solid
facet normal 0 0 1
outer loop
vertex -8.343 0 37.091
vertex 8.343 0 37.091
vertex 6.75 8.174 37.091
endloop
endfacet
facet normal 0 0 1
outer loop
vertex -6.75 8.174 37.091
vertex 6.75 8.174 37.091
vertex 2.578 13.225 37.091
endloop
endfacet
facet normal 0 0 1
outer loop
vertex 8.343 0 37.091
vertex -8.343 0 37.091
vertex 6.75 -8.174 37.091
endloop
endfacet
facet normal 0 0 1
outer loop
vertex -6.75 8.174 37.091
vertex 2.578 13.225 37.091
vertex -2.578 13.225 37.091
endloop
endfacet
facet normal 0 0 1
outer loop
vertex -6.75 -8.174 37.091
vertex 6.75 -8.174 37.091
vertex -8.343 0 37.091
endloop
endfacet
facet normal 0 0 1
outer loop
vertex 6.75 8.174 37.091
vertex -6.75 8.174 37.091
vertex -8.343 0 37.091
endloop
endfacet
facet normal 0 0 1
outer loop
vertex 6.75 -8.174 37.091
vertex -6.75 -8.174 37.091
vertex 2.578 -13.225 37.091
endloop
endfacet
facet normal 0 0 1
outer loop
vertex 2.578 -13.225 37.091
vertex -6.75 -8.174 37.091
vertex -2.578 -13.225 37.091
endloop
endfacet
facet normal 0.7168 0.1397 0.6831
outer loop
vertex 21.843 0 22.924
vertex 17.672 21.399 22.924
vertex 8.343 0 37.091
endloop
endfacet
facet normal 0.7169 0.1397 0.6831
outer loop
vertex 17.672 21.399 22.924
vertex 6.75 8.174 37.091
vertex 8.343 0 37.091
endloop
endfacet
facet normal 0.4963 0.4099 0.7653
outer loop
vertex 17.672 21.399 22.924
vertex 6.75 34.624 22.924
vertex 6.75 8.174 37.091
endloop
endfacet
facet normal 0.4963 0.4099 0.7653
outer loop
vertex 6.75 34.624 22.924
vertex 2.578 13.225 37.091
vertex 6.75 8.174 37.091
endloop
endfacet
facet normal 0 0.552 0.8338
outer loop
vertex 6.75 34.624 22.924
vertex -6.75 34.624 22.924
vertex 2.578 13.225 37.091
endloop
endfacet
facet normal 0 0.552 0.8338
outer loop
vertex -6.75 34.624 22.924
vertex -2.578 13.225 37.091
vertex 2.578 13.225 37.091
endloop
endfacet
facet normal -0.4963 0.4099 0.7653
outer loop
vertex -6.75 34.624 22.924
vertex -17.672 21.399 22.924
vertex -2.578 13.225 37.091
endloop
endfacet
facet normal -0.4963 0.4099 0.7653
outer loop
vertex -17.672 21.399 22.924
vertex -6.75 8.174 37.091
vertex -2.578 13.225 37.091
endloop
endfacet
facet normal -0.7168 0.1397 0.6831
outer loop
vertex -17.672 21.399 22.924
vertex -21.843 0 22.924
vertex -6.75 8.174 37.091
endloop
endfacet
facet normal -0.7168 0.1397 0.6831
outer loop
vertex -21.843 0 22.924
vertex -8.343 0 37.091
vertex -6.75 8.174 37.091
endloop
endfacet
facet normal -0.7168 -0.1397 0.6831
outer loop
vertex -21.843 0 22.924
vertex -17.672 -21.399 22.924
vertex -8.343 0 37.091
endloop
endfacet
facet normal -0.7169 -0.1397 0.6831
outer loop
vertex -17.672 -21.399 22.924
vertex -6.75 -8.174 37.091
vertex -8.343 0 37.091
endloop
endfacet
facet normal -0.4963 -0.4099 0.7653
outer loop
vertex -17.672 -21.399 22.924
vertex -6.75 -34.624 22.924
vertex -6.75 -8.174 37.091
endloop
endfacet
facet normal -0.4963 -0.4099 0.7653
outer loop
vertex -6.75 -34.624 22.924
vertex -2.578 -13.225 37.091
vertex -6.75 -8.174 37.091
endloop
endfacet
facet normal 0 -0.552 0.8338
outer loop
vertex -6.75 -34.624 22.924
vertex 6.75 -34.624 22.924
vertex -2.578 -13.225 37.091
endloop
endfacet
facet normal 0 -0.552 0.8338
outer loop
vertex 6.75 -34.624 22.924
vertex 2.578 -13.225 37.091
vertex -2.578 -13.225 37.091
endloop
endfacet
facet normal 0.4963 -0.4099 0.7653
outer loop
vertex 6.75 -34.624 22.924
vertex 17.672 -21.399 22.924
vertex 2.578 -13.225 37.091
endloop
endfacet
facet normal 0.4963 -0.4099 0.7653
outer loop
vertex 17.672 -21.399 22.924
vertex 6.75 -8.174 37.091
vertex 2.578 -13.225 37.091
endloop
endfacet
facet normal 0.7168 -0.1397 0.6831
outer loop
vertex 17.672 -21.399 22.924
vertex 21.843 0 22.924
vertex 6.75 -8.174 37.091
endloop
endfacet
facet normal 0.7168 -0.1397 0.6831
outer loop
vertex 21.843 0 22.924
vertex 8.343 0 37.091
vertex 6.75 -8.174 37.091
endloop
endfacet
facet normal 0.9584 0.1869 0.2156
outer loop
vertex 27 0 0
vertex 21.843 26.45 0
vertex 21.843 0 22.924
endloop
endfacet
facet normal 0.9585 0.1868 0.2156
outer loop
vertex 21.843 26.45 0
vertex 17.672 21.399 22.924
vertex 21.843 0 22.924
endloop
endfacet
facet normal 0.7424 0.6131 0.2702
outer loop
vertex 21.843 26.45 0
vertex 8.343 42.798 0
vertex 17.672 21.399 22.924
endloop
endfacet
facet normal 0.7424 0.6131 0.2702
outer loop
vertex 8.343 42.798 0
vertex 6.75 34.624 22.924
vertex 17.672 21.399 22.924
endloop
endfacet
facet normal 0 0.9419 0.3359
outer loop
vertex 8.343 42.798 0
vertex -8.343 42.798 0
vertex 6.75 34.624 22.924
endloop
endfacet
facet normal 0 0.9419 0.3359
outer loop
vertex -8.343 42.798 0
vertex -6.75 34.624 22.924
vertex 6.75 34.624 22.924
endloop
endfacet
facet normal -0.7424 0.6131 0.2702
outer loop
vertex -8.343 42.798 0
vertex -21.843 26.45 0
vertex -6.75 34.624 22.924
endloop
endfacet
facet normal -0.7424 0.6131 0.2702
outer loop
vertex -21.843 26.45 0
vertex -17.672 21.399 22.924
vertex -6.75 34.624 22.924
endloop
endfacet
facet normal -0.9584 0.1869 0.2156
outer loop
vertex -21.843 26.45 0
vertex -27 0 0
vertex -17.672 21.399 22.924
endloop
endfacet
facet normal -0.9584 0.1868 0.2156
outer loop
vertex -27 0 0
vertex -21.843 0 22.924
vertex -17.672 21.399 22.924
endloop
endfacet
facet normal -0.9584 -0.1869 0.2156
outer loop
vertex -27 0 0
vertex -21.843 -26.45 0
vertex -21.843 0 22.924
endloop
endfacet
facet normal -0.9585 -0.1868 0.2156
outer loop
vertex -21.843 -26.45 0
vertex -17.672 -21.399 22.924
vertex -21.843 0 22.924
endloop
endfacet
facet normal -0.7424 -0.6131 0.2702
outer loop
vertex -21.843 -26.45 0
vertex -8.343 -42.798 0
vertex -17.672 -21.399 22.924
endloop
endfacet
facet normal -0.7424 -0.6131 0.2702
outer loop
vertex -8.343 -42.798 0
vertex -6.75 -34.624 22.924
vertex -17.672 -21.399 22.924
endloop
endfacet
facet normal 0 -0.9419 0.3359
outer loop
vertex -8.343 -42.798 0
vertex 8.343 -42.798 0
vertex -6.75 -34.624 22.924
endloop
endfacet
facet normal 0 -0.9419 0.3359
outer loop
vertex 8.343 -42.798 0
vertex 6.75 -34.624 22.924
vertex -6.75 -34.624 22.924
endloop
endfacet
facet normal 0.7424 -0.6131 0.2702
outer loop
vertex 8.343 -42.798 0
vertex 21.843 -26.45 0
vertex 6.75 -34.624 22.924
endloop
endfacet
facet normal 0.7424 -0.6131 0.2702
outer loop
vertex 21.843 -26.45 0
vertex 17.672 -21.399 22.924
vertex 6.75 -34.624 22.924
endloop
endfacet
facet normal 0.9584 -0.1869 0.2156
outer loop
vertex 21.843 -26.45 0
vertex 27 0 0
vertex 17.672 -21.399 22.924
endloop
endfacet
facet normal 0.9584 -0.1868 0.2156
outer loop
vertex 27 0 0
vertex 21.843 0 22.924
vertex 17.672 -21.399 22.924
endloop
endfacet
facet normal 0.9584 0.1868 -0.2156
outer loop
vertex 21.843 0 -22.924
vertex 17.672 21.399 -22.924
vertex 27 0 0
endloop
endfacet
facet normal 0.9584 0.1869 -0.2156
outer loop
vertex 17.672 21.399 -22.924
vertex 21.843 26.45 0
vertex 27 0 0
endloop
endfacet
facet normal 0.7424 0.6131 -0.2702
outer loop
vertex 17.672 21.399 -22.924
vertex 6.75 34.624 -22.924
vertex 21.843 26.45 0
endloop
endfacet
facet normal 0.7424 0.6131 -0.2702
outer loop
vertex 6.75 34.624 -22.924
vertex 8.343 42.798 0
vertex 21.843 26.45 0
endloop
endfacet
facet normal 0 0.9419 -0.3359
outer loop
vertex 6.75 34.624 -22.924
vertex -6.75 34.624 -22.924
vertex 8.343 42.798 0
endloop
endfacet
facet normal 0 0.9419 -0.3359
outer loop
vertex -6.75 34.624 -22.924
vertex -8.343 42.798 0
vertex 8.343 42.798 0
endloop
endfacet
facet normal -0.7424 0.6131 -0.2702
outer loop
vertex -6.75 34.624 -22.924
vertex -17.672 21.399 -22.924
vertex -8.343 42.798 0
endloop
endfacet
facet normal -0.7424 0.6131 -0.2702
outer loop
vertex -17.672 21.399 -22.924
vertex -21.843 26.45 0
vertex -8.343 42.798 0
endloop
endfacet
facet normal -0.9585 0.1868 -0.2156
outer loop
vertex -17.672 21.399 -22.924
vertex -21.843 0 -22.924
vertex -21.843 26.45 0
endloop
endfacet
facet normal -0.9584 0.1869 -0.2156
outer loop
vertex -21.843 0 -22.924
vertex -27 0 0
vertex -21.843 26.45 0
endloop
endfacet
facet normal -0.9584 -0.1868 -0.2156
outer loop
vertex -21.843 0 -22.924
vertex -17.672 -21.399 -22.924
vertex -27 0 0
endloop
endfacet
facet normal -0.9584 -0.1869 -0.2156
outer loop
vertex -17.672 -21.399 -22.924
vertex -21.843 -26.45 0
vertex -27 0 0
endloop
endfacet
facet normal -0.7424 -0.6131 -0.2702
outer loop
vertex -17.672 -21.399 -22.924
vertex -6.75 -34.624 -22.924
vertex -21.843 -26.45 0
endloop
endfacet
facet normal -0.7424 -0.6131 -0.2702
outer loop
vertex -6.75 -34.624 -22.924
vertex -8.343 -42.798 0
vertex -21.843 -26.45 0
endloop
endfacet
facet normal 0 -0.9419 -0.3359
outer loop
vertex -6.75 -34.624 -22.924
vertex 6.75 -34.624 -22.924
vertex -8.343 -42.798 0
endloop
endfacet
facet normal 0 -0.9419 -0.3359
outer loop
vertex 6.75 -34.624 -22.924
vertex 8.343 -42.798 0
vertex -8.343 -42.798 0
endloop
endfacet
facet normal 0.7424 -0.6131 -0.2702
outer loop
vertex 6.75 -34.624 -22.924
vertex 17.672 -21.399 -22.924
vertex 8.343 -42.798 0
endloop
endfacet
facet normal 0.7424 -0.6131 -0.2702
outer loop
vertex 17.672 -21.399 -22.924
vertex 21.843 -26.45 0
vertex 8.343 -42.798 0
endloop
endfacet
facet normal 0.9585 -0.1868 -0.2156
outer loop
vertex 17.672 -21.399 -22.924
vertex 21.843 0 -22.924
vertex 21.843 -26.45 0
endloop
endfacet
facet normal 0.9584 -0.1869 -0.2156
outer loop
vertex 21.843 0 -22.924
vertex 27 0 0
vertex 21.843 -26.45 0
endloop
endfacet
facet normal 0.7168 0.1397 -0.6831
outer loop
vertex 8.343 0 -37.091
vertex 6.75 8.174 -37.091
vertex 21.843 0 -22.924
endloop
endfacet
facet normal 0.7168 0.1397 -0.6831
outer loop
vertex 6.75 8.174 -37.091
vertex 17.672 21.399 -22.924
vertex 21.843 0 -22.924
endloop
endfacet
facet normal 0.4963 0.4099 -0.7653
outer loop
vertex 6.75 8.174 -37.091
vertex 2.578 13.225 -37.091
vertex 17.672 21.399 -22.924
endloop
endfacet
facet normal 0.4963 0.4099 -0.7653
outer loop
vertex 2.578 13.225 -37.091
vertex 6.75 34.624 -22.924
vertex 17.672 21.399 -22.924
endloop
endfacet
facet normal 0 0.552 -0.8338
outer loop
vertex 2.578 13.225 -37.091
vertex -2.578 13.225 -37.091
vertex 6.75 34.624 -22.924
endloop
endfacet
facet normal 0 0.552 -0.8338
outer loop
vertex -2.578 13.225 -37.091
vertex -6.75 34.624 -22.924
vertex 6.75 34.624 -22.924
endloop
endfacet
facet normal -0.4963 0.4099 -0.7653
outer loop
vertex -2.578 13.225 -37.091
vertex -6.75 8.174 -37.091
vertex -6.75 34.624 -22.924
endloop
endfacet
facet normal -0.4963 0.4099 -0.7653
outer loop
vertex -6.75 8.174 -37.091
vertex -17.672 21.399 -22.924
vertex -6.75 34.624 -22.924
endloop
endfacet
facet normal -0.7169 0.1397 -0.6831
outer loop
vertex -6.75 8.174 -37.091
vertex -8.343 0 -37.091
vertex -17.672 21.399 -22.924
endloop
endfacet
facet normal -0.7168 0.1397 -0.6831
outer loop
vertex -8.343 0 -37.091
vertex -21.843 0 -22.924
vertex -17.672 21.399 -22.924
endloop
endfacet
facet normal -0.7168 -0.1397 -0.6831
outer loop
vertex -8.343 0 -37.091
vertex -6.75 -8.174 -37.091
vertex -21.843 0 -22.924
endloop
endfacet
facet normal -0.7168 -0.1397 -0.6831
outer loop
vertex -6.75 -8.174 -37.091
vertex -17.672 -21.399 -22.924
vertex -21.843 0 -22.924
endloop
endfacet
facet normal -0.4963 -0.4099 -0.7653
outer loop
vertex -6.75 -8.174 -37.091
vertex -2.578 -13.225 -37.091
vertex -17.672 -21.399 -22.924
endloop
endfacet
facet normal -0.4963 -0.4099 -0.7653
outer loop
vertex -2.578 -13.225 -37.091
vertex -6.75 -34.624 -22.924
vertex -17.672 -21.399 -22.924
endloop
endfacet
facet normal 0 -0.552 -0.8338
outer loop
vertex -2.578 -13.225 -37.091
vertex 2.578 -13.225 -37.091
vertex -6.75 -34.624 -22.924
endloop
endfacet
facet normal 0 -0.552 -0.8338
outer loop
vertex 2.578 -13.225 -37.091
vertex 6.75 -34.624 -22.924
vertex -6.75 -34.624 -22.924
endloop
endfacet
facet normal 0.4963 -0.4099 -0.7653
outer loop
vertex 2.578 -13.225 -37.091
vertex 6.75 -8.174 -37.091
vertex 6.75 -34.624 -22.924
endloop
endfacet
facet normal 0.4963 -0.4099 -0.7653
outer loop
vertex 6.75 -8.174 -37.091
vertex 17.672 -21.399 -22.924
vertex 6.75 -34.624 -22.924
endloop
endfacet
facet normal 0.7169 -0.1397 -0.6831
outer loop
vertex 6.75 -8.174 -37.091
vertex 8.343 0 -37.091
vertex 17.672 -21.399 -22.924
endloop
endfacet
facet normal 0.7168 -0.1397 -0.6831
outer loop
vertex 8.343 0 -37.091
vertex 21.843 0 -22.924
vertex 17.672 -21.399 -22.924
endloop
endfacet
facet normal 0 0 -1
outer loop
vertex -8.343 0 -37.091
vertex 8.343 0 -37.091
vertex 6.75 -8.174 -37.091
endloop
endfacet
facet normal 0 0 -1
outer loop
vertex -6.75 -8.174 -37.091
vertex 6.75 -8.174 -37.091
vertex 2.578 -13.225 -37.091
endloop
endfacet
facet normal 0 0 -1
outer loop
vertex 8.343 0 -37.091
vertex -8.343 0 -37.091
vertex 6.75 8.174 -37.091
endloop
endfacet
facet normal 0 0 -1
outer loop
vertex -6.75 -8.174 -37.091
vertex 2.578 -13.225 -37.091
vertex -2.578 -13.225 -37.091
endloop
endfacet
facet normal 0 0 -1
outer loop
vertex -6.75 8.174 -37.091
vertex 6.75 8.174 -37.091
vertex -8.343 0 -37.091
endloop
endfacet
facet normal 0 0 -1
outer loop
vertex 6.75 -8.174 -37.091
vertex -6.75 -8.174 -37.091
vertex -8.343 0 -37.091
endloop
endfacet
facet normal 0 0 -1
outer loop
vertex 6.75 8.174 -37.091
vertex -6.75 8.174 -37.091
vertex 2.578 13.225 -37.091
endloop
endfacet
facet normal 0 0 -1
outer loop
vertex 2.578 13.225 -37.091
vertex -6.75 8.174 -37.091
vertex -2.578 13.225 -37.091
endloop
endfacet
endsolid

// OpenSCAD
// Generated by SolidPython 1.0.1 on 2020-07-29 00:46:49


scale(v = [9, 15, 13]) {
	sphere(r = 3);
}
/***********************************************
*********      SolidPython code:      **********
************************************************
 
# import packages: SolidPython
from solid import *
from solid.utils import *
from itertools import chain, combinations, permutations


class Resize:

    def __init__(self, scad_file):
        self.scad_file = scad_file
        #self.scad_file = import_scad(scad_file)
        # cone/cylinder param:
        self.r1 = 0
        self.r2 = 0
        self.h = 0
        # rectangular prism param:
        self.w = 0
        self.l = 0
        # ellipse param:
        self.r = 0

    # import OpenScad code (file name corresponds to shape)


    # classify shape + parameters
    def assign(self, param1, param2, param3):
        if self.scad_file == 'cone.scad':
            self.r1 = param1
            self.r2 = param2
            self.h = param3
        elif self.scad_file == 'cylinder.scad':
            self.r1 = param1
            self.r2 = param2
            self.h = param3
        elif self.scad_file == 'rectangularPrism.scad':
            self.h = param1
            self.l = param2
            self.w = param3
        else:
            self.r = param1
            self.h = param2

    # resize parameters
    def iterate(self):
        x = range(3, 20, 2)
        i = 1
        if self.scad_file == 'cone.scad':
            tempList = list(permutations(x, 2))
            for temp in tempList:
                param1 = temp[0]
                param2 = temp[1]
                filepath = 'produced_scad_files/' + 'cone' + str(param1) + '_' + str(param2) + '_' + '.scad'
                scad_render_to_file(cylinder(h=param1, r1=param2, r2=0), filepath)

        elif self.scad_file == 'cylinder.scad':
            tempList = list(permutations(x, 3))
            for temp in tempList:
                param1 = temp[0]
                param2 = temp[1]
                filepath = 'produced_scad_files/' + 'cylinder' + str(param1) + '_' + str(param2) + '_' + '.scad'
                scad_render_to_file(cylinder(h=param1, r1=param2, r2=param2), filepath)

        elif self.scad_file == 'rectangularPrism.scad':
            tempList = list(permutations(x, 3))
            for temp in tempList:
                param1 = temp[0]
                param2 = temp[1]
                param3 = temp[2]
                filepath = 'produced_scad_files/' + 'rectangularPrism' + str(param1) + '_' + str(param2) + '_' + str(
                    param3) + '.scad'
                scad_render_to_file(cube(size=(param1, param2, param3)), filepath)

        elif self.scad_file == 'ellipse.scad':
            tempList = list(permutations(x, 4))
            for temp in tempList:
                param1 = temp[0]
                param2 = temp[1]
                param3 = temp[2]
                param4 = temp[3]
                filepath = 'produced_scad_files/' + 'ellipse' + str(param1) + '_' + str(param2) + '_' + str(param3) + '_' + str(param4) + '.scad'
                scad_render_to_file(scale([param1, param2, param3])(sphere(r=param4)), filepath)

    def render_to_scadfile(self):
        scad_render_to_file(scad, 'example.scad') 
 
************************************************/
